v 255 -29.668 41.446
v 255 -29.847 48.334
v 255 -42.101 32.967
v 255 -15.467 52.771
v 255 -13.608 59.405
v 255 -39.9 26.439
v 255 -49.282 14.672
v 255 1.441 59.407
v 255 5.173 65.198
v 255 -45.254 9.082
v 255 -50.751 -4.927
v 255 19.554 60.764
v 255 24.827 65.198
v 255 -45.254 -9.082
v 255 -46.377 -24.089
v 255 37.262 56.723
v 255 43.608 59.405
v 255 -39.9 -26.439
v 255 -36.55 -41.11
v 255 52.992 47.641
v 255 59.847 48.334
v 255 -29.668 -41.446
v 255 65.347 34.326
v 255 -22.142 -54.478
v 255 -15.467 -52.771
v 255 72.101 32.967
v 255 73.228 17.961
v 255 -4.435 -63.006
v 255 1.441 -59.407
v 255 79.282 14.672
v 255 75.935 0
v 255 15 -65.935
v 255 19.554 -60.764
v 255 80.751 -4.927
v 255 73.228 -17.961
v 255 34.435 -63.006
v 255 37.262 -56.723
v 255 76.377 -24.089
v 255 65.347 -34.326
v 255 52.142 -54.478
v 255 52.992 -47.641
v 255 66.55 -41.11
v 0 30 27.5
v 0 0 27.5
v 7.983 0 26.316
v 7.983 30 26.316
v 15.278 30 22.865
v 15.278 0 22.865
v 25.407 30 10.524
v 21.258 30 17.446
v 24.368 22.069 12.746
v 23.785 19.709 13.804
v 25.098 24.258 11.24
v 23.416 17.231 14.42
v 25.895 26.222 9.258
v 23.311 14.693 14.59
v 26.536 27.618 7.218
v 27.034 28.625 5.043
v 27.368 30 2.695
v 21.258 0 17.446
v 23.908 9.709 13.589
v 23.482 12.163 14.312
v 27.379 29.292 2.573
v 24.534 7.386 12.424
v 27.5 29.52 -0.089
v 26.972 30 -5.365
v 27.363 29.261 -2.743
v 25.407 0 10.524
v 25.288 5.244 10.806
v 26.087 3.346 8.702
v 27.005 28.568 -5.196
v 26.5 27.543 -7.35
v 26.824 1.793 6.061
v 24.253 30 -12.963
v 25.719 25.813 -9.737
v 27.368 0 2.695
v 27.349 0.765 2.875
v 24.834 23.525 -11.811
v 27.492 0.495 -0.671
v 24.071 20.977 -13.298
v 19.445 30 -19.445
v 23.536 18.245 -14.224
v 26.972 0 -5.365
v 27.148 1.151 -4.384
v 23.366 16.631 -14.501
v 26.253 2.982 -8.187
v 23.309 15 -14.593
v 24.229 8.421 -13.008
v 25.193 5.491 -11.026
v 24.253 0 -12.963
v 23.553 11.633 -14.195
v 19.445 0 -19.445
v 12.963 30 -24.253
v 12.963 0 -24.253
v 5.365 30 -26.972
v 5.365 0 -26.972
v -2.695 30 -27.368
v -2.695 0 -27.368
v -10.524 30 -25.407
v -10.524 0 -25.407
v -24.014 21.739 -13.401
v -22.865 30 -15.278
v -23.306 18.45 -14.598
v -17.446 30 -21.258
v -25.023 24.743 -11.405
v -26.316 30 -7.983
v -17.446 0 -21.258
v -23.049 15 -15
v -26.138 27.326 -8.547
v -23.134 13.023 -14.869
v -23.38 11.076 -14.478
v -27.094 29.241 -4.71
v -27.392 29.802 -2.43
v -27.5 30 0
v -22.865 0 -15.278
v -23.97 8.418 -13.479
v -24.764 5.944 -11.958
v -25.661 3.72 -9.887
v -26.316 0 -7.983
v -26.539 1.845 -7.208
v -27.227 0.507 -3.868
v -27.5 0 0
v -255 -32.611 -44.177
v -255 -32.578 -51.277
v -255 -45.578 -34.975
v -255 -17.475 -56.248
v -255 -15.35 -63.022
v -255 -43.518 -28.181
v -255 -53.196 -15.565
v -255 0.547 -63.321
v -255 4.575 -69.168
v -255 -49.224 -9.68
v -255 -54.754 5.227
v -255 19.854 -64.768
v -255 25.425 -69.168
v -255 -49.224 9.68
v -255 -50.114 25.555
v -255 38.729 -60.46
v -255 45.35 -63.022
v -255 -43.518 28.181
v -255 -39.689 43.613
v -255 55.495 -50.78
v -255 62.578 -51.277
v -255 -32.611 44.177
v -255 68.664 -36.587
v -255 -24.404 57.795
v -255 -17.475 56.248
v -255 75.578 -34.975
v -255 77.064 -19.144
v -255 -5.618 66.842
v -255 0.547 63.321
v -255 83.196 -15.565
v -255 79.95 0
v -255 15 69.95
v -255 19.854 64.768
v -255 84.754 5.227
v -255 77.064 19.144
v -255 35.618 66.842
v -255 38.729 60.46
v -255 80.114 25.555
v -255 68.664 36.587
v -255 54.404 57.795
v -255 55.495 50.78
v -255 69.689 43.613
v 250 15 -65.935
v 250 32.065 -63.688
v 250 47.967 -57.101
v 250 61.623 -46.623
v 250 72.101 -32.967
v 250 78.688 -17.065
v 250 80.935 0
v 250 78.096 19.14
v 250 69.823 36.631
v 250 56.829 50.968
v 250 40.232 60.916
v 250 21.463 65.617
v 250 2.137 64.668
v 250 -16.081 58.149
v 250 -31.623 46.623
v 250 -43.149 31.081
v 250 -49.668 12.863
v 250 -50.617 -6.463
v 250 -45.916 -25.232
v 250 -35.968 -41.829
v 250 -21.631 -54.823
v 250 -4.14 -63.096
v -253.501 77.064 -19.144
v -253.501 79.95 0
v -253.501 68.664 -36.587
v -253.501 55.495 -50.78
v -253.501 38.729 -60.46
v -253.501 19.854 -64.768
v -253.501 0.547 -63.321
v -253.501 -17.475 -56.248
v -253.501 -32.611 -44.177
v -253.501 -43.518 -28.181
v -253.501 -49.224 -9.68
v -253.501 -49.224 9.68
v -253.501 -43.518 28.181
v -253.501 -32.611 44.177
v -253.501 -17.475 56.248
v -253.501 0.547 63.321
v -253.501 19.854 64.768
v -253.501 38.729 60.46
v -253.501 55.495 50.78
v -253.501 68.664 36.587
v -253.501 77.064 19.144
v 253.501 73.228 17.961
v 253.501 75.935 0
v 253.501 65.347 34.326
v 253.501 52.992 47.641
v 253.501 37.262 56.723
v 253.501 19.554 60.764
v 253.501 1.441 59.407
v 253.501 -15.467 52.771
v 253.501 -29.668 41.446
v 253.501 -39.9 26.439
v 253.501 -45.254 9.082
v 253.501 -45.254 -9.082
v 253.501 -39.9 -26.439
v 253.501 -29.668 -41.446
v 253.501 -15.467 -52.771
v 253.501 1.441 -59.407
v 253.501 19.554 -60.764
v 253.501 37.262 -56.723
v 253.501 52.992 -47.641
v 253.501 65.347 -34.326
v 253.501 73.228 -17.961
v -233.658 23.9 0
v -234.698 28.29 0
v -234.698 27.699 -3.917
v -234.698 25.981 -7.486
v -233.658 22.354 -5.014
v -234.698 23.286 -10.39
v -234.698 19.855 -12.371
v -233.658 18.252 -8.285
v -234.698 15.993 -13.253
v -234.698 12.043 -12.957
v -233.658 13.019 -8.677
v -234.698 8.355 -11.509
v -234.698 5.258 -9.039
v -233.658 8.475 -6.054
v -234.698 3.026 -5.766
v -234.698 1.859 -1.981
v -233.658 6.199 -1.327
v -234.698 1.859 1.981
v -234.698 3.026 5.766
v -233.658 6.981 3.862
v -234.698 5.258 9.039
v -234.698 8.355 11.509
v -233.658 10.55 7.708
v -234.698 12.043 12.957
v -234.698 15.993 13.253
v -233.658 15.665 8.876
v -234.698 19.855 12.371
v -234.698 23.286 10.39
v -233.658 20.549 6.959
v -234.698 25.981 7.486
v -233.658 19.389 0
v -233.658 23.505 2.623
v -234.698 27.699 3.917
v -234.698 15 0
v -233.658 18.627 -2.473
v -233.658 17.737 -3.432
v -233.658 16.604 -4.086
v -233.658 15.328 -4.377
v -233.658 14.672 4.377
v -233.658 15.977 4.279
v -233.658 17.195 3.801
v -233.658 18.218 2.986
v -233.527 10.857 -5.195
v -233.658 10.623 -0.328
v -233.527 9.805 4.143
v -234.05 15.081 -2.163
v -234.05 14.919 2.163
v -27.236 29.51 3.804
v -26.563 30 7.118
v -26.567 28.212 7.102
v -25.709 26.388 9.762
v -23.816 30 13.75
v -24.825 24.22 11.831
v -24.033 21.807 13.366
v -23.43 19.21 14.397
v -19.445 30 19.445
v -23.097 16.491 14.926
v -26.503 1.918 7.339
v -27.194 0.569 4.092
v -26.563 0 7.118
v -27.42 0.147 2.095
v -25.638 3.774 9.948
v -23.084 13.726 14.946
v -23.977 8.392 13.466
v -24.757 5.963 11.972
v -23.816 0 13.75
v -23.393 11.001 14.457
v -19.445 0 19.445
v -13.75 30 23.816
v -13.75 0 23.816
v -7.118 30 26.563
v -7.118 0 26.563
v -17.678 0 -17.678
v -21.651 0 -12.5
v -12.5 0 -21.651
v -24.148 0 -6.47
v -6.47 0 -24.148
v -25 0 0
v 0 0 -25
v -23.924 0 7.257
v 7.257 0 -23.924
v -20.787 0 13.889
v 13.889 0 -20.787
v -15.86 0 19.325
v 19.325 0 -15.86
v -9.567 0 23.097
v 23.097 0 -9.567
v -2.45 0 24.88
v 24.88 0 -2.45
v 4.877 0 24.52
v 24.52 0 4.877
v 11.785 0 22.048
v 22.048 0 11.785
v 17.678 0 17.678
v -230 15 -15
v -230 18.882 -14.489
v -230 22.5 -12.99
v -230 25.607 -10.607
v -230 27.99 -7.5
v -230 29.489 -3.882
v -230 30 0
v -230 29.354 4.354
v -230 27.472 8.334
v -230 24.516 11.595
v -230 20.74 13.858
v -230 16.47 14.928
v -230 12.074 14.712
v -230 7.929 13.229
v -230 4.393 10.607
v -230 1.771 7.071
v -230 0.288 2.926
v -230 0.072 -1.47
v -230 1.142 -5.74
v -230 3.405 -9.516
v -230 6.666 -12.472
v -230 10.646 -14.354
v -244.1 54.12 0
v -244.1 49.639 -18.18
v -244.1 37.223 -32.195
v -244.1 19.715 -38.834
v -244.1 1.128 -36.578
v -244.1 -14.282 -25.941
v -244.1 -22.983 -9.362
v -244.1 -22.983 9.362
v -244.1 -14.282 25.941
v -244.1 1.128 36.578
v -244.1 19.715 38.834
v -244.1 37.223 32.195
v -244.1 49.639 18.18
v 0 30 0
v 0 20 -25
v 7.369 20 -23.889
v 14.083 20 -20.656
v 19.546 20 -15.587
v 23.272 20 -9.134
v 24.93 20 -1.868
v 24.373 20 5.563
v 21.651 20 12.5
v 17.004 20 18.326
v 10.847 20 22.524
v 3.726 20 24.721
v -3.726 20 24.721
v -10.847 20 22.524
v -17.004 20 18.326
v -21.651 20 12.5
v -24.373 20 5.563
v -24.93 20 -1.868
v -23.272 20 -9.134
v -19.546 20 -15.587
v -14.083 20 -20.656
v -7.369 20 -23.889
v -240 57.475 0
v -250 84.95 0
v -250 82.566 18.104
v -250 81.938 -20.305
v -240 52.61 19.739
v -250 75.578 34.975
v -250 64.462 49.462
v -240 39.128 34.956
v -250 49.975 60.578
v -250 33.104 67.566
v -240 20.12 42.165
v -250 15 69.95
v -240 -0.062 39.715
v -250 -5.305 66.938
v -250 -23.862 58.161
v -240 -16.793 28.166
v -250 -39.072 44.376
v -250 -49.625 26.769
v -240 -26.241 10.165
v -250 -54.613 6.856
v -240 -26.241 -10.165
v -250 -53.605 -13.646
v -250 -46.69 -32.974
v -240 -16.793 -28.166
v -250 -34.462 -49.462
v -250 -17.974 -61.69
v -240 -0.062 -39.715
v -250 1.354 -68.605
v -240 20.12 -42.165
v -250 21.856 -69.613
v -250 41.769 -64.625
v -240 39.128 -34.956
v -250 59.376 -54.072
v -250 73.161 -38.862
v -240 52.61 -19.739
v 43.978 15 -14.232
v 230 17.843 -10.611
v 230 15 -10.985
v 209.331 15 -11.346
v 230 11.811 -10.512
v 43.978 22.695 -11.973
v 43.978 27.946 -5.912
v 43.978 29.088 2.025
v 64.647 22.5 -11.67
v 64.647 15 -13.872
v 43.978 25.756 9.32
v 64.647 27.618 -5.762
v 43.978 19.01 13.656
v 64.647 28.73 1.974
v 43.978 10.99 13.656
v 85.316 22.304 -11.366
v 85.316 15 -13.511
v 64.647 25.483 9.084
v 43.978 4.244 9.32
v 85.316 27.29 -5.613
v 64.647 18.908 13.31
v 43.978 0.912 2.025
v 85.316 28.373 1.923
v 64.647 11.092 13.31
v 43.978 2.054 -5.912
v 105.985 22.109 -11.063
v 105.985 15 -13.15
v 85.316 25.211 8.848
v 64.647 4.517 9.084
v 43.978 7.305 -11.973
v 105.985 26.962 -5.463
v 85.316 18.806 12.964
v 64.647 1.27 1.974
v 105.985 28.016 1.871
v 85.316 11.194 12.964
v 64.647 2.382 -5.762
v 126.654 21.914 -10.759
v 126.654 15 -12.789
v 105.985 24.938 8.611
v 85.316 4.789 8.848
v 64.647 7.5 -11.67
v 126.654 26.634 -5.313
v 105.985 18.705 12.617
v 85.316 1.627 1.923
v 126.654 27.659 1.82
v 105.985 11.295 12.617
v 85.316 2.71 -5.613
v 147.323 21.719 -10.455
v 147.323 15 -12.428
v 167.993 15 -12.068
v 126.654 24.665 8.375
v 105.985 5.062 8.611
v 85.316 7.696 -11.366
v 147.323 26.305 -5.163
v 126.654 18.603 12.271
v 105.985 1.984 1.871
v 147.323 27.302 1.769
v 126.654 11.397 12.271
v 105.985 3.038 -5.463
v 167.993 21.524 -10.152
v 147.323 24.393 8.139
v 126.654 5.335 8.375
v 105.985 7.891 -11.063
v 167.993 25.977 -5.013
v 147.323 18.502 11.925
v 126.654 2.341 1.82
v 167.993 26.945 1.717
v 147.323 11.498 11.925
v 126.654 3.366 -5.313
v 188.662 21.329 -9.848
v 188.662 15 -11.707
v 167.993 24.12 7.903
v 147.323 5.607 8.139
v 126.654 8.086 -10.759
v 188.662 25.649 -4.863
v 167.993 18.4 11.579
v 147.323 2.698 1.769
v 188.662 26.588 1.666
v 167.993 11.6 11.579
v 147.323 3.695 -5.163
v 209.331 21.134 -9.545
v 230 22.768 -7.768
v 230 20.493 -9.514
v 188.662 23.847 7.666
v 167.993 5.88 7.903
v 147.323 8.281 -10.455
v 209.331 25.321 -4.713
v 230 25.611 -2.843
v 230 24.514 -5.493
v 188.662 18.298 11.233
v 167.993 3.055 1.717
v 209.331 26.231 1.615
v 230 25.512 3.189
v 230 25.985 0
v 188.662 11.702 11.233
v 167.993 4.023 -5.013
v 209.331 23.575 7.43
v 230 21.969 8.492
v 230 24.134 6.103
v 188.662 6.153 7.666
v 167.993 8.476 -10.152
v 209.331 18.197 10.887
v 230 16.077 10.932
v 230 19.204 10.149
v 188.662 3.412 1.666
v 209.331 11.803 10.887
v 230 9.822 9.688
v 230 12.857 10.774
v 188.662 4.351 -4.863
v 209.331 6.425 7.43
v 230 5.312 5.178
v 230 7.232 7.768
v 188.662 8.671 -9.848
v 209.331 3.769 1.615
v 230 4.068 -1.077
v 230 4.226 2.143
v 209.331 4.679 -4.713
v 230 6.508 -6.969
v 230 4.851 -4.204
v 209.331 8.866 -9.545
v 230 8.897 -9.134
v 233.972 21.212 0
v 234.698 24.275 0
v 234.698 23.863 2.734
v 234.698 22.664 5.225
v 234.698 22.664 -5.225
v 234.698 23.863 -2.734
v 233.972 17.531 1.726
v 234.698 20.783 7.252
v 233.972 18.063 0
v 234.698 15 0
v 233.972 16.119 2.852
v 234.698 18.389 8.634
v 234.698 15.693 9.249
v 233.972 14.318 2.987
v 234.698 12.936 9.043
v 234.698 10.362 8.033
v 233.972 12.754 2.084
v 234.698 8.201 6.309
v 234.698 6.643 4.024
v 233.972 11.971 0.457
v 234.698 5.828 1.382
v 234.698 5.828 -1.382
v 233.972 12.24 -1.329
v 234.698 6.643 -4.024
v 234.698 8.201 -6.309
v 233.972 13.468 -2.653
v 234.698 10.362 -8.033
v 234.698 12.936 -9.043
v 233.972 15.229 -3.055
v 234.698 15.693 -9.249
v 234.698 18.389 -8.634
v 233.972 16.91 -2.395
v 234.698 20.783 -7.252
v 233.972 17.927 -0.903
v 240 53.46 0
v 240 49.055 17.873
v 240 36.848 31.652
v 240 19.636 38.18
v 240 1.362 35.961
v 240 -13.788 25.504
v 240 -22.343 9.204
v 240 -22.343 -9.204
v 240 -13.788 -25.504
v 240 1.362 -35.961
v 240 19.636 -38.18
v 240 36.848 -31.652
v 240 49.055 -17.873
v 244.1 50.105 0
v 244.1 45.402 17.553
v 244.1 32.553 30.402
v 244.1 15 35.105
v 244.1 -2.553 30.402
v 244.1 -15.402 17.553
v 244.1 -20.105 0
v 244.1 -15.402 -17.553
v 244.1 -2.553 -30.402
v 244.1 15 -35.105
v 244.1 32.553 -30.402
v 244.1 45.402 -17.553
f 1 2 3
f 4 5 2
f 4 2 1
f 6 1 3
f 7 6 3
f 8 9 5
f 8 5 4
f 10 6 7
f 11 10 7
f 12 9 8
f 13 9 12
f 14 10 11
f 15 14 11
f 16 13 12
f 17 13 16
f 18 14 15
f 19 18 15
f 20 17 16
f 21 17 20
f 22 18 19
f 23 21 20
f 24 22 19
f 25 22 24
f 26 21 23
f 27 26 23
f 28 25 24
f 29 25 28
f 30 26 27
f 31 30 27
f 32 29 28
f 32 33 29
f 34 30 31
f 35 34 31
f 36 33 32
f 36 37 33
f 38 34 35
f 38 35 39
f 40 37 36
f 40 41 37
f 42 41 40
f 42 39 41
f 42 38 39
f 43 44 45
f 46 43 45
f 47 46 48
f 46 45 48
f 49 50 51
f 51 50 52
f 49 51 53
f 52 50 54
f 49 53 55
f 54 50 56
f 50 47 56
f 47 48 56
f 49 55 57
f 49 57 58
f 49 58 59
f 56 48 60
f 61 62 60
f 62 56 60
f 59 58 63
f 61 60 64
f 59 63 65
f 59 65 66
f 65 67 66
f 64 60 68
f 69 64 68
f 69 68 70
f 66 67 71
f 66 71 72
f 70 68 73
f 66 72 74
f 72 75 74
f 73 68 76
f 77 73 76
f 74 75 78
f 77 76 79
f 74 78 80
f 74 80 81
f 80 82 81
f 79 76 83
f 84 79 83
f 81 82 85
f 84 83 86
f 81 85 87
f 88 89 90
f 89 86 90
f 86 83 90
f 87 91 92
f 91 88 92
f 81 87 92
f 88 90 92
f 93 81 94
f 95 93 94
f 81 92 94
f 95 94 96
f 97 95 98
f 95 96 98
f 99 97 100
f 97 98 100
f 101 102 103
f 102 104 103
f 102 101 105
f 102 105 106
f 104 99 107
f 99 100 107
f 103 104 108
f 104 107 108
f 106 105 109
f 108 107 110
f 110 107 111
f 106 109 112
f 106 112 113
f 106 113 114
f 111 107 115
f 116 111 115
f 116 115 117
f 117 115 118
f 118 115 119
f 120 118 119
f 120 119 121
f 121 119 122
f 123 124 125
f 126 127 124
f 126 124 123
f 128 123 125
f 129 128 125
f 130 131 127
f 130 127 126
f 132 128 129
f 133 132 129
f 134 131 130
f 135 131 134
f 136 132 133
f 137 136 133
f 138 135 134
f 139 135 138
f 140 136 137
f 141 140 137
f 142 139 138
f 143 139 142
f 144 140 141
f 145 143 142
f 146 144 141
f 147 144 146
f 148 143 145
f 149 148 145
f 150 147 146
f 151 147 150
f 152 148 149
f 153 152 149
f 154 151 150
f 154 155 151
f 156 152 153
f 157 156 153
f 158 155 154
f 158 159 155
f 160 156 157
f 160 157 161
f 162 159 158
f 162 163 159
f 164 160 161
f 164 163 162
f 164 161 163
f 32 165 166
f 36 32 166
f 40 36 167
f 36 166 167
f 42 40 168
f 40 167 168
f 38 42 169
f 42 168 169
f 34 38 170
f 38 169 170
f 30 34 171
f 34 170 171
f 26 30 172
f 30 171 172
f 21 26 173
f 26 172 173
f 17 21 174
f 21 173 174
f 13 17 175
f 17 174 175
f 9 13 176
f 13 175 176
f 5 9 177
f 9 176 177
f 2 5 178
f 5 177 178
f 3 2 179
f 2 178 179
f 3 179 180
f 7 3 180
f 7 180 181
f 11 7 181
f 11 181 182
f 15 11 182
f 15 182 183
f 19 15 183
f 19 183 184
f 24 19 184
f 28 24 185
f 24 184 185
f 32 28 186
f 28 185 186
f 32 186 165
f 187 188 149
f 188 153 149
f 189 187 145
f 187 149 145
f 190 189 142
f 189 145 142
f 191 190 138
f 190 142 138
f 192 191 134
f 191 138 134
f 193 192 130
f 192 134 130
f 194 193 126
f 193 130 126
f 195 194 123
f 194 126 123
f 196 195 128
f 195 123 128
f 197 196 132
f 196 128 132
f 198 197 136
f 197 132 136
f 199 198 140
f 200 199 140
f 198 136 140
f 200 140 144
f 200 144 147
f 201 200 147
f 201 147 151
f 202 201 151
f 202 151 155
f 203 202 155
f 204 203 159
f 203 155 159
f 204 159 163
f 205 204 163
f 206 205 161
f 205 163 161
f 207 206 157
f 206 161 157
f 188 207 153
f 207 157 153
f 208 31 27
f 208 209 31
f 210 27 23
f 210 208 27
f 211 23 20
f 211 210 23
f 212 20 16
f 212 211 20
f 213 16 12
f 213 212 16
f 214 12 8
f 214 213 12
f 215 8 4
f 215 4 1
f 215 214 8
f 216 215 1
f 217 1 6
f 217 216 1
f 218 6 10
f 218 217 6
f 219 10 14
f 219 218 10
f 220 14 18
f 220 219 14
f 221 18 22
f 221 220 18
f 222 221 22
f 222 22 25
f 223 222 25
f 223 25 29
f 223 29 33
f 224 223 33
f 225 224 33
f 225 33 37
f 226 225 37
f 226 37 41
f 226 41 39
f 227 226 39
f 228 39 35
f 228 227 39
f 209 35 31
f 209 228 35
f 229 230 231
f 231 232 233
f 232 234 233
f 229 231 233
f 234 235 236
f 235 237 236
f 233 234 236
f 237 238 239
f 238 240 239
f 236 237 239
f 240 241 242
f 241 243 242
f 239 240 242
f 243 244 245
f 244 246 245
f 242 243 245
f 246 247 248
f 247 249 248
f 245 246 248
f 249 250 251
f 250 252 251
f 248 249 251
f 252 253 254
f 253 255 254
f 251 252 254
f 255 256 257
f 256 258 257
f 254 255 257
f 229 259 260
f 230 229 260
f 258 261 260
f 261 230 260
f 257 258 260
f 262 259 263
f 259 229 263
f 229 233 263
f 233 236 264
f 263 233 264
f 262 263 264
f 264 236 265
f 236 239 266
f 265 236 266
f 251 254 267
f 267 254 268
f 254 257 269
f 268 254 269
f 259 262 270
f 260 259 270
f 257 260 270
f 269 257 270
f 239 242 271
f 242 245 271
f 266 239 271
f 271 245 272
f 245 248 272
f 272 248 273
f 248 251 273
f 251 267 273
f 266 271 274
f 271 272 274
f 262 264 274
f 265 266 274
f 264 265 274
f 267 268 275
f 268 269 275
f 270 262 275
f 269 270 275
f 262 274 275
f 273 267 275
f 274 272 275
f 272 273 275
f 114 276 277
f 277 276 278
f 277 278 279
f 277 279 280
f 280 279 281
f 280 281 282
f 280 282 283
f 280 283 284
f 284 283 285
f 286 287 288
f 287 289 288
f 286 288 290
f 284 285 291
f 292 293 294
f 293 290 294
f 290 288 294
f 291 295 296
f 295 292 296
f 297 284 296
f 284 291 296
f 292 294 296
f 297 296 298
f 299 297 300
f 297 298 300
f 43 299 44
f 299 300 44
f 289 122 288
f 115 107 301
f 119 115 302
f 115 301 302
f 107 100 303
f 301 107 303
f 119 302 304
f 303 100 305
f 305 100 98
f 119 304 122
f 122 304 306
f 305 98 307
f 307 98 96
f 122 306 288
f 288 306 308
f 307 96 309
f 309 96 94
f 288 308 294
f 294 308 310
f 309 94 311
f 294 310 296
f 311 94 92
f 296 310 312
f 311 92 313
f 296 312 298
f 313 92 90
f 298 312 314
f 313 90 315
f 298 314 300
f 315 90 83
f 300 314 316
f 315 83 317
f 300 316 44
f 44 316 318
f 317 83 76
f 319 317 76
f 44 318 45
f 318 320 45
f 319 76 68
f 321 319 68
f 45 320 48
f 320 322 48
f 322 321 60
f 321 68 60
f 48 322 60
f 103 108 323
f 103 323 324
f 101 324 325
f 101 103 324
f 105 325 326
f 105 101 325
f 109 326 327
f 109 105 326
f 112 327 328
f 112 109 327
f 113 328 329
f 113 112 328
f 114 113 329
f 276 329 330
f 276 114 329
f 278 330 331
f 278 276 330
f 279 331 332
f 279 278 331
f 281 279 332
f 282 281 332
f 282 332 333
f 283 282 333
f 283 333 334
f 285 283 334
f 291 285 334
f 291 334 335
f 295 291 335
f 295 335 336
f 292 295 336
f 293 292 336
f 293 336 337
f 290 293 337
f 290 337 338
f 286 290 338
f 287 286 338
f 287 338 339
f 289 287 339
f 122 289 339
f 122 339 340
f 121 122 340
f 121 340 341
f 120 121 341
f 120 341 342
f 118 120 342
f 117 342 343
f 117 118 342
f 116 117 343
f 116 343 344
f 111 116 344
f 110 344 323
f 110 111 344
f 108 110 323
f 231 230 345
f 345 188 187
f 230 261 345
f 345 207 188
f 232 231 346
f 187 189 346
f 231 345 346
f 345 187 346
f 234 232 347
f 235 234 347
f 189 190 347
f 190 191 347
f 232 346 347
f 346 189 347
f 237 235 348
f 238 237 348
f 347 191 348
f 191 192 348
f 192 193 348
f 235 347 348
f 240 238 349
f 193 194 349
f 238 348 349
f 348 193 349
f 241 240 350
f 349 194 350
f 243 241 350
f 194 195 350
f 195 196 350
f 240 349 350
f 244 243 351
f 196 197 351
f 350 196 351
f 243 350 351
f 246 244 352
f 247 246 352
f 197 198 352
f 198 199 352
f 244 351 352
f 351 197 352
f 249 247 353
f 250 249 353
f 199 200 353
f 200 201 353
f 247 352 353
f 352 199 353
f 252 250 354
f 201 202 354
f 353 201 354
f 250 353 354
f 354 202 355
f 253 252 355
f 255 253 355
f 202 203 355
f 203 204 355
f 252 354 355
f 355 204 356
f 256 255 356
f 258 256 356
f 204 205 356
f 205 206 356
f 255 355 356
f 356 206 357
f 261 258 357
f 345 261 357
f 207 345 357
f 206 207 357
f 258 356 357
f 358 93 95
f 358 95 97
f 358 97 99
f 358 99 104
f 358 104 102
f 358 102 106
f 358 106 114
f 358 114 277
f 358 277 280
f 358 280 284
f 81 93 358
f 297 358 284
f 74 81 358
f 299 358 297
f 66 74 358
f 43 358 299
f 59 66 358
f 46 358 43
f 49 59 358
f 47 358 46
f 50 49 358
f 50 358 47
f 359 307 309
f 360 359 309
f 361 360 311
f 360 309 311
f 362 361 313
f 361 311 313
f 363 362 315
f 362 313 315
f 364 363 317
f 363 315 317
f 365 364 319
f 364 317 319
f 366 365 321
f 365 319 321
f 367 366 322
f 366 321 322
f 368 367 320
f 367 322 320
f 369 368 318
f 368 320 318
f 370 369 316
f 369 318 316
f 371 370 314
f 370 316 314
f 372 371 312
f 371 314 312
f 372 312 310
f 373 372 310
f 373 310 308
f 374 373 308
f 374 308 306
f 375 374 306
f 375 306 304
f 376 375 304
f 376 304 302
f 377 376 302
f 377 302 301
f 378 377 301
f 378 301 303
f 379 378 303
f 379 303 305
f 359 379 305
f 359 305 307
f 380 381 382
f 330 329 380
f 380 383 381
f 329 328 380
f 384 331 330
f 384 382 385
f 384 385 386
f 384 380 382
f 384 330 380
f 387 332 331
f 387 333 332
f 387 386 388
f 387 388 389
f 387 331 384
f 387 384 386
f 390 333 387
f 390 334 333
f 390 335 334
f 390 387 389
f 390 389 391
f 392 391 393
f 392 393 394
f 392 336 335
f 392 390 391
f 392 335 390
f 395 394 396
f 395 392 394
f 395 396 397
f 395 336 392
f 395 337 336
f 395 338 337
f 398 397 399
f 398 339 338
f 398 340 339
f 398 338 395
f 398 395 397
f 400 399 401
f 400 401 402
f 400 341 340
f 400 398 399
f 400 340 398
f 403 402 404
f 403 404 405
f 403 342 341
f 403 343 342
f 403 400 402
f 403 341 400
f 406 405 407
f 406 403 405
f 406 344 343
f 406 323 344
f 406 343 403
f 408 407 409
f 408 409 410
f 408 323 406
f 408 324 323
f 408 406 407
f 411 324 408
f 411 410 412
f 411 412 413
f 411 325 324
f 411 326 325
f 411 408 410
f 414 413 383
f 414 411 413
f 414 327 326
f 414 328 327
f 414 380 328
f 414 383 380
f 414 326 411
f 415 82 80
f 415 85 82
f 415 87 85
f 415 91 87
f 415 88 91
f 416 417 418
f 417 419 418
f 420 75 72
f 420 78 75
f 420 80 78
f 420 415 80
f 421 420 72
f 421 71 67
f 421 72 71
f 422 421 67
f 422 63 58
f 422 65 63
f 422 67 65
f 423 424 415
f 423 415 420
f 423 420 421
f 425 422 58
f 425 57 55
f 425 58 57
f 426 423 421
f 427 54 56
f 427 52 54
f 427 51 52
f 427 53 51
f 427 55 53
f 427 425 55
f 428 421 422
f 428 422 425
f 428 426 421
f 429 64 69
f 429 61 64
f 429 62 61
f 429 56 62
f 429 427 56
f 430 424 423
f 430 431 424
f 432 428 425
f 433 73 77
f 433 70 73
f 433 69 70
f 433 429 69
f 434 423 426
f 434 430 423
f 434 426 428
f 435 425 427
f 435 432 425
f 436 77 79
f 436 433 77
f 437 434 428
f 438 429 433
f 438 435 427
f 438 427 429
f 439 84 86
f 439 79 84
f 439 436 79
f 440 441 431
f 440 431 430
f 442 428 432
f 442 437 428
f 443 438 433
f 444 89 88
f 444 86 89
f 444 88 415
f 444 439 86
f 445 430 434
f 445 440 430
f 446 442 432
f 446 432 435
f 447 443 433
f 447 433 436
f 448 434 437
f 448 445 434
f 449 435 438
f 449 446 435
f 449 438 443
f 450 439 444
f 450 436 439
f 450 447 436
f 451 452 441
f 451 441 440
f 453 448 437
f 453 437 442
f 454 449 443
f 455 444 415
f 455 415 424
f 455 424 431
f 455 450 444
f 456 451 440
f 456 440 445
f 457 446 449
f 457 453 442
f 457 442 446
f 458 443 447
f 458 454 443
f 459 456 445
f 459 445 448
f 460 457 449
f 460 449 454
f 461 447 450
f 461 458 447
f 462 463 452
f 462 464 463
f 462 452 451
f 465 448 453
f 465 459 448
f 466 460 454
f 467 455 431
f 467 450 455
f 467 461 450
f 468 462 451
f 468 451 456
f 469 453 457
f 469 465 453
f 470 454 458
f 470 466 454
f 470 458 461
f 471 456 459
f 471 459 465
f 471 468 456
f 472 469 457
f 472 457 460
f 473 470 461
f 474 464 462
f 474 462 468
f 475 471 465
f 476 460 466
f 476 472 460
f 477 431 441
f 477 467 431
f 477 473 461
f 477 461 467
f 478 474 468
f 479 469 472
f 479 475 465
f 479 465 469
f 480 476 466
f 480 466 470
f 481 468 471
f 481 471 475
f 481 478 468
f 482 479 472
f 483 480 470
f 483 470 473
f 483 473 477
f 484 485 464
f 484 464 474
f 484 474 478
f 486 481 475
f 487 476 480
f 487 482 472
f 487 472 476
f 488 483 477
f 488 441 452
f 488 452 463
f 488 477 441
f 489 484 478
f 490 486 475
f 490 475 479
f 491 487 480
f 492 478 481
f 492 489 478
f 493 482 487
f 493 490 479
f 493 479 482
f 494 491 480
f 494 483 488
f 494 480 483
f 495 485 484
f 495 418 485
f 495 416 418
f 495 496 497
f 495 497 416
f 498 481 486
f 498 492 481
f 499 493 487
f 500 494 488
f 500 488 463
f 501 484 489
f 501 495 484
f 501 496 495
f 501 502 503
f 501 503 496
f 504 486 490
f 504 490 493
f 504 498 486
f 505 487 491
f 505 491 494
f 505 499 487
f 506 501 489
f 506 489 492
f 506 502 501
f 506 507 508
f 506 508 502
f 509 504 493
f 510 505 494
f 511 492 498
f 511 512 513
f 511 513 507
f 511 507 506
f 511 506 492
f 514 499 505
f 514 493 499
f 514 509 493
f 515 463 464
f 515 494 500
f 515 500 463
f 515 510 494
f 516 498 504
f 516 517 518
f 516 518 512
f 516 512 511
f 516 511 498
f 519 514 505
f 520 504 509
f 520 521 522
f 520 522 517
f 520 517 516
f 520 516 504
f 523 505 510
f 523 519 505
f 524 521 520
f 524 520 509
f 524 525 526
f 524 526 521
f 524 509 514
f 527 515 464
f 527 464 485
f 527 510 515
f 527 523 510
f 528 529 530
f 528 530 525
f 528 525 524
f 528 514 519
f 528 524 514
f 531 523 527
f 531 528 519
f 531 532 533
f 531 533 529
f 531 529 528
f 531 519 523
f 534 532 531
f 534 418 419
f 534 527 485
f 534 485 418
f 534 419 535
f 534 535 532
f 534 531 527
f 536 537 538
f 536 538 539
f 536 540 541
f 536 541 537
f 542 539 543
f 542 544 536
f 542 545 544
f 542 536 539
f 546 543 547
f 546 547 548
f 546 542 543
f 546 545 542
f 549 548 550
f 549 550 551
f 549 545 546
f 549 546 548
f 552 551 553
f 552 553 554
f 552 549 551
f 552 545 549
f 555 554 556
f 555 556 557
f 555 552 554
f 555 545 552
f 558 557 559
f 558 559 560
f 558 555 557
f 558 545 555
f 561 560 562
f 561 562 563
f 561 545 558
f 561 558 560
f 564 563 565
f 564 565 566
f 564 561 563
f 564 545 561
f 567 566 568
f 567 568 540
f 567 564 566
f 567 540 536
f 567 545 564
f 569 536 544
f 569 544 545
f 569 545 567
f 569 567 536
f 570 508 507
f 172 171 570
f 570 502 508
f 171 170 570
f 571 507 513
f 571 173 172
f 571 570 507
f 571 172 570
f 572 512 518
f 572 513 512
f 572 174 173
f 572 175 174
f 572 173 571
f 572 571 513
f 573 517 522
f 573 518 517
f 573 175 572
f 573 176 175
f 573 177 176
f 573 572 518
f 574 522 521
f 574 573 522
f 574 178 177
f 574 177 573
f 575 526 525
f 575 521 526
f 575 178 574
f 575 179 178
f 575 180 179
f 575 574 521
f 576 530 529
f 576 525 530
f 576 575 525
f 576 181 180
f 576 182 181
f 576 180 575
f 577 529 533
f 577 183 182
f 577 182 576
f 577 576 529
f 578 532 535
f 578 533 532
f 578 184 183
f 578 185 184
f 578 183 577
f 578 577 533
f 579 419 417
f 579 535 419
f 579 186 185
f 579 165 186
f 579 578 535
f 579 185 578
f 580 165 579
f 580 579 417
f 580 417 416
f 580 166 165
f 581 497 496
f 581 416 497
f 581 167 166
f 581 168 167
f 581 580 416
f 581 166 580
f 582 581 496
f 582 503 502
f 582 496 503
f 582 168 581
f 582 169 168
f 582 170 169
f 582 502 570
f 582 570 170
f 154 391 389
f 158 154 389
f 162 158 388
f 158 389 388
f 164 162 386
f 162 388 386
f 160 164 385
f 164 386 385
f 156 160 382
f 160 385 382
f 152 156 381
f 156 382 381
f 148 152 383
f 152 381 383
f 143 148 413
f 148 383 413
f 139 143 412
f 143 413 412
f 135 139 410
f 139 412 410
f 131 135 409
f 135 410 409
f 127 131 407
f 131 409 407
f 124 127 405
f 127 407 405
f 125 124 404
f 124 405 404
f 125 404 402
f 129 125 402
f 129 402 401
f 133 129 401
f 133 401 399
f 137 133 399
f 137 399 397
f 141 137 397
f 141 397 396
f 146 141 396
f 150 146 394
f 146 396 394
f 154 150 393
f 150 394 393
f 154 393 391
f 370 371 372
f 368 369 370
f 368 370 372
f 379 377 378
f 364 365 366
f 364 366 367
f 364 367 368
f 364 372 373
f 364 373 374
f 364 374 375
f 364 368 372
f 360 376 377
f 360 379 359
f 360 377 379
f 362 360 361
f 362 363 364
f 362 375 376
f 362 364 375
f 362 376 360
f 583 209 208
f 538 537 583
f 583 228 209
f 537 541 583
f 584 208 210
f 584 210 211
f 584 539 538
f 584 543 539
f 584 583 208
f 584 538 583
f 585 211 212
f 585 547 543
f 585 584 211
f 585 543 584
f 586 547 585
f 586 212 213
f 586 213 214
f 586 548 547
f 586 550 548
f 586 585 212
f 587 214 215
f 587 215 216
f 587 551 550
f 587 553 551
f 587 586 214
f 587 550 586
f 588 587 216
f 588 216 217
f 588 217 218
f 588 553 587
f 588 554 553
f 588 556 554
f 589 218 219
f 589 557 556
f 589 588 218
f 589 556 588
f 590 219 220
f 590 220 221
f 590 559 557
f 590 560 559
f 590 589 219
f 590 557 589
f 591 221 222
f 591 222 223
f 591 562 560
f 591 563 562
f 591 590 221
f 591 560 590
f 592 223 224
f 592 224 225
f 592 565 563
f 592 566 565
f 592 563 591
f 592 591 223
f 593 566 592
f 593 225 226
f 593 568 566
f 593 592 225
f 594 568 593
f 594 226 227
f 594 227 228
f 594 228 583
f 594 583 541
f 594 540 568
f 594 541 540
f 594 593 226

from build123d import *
from build123d.topology import SkipClean

# Parameters (mm, degrees)
SKETCH1_R                     = 27.5
BOSS_EXTRUDE1_DEPTH           = 30
SKETCH4_R                     = 15
BOSS_EXTRUDE3_DEPTH           = 230
BOSS_EXTRUDE3_TAPER           = 1
BOSS_EXTRUDE3_OTHER_WAY_DEPTH = 230
SKETCH2_R                     = 25
CUT_EXTRUDE4_DEPTH            = 20
SKETCH10_R                    = 65.934883456
BOSS_EXTRUDE7_DEPTH           = 5
SKETCH11_R                    = 69.949548389
BOSS_EXTRUDE8_DEPTH           = 5


# Read off the part's stored shape, not the designer's step: Boss-Extrude4, Boss-Extrude5
with BuildPart() as part:
    # Sketch1 → Boss-Extrude1 (new body)
    with BuildSketch(Plane(origin=(0, 0, 0), x_dir=(1, 0, 0), z_dir=(0, 1, 0))):
        with Locations(Location((0, 0, 0), (0, 0, 270))):
            Circle(SKETCH1_R)
    extrude(amount=BOSS_EXTRUDE1_DEPTH)

    # Sketch4 → Boss-Extrude3 (add)
    with BuildSketch(Plane(origin=(0, 0, 0), x_dir=(0, 0, -1), z_dir=(1, 0, 0))):
        with Locations((0, 15)):
            Circle(SKETCH4_R)
    extrude(amount=BOSS_EXTRUDE3_DEPTH, taper=BOSS_EXTRUDE3_TAPER)

    # Sketch4 → Boss-Extrude3 other way (add)
    with SkipClean():  # the faces are left unmerged after this step: merging them gives an invalid solid
        with BuildSketch(Plane(origin=(0, 0, 0), x_dir=(0, 0, -1), z_dir=(1, 0, 0))):
            with Locations((0, 15)):
                Circle(SKETCH4_R)
        extrude(amount=-BOSS_EXTRUDE3_OTHER_WAY_DEPTH)

    # Sketch2 → Cut-Extrude4 (cut)
    with SkipClean():  # the faces are left unmerged after this step: merging them gives an invalid solid
        with BuildSketch(Plane.XZ):
            with Locations(Location((0, 0, 0), (0, 0, 270))):
                Circle(SKETCH2_R)
        extrude(amount=-CUT_EXTRUDE4_DEPTH, mode=Mode.SUBTRACT)

    # Boss-Extrude4 outline → Boss-Extrude4 (revolve)
    with SkipClean():  # the faces are left unmerged after this step: merging them gives an invalid solid
        with BuildSketch(Plane(origin=(0, 15, 0), x_dir=(0, 1, 0), z_dir=(0, 0, -1))):
            Polygon((0, 230), (10.985335067, 230), (65.934883456, 250), (0, 250), align=None)
        revolve(axis=Axis((0, 15, 0), (1, 0, 0)))

    # Boss-Extrude5 outline → Boss-Extrude5 (revolve)
    with SkipClean():  # the faces are left unmerged after this step: merging them gives an invalid solid
        with BuildSketch(Plane(origin=(0, 15, 0), x_dir=(0, 1, 0), z_dir=(0, 0, -1))):
            Polygon((69.949548389, -250), (15, -230), (0, -230), (0, -250), align=None)
        revolve(axis=Axis((0, 15, 0), (1, 0, 0)))

    # Sketch10 → Boss-Extrude7 (add)
    with SkipClean():  # the faces are left unmerged after this step: merging them gives an invalid solid
        with BuildSketch(Plane(origin=(250, 0, 0), x_dir=(0, 0, -1), z_dir=(1, 0, 0))):
            with Locations((0, 15)):
                Circle(SKETCH10_R)
        extrude(amount=BOSS_EXTRUDE7_DEPTH)

    # Sketch11 → Boss-Extrude8 (add)
    with SkipClean():  # the faces are left unmerged after this step: merging them gives an invalid solid
        with BuildSketch(Plane.ZY.offset(250)):
            with Locations((0, 15)):
                Circle(SKETCH11_R)
        extrude(amount=BOSS_EXTRUDE8_DEPTH)

    # Sketch12 → Cut-Revolve3 (revolve, cut)
    with SkipClean():  # the faces are left unmerged after this step: merging them gives an invalid solid
        with BuildSketch(Plane(origin=(0, 15, 0), x_dir=(1, 0, 0), z_dir=(0, 1, 0)), mode=Mode.PRIVATE) as cut_revolve3_sk:
            with BuildLine():
                Line((-234.698463104, 13.289899283), (-253.501037691, 64.949548389))
                Line((-253.501037691, 64.949548389), (-255, 64.949548389))
                Line((-255, 64.949548389), (-255, 0))
                Line((-255, 0), (-234.698463104, 0))
                ThreePointArc((-234.698463104, 0), (-233.526779197, 6.644949642), (-234.698463104, 13.289899283))
            make_face()
        revolve(cut_revolve3_sk.sketch.rotate(Axis((373.268217057, 15, 0), (-1, 0, 0)), 270), axis=Axis((373.268217057, 15, 0), (-1, 0, 0)), mode=Mode.SUBTRACT)

    # Sketch14 → Cut-Revolve4 (revolve, cut)
    with SkipClean():  # the faces are left unmerged after this step: merging them gives an invalid solid
        with BuildSketch(Plane(origin=(0, 15, 0), x_dir=(1, 0, 0), z_dir=(0, 1, 0)), mode=Mode.PRIVATE) as cut_revolve4_sk:
            with BuildLine():
                Line((255, 60.934883456), (253.501037691, 60.934883456))
                Line((253.501037691, 60.934883456), (234.698463104, 9.27523435))
                ThreePointArc((234.698463104, 9.27523435), (233.88072607, 4.637617175), (234.698463104, 0))
                Line((234.698463104, 0), (255, 0))
                Line((255, 0), (255, 60.934883456))
            make_face()
        revolve(cut_revolve4_sk.sketch.rotate(Axis((84.599815478, 15, 0), (1, 0, 0)), 90), axis=Axis((84.599815478, 15, 0), (1, 0, 0)), mode=Mode.SUBTRACT)


solid = part.part
